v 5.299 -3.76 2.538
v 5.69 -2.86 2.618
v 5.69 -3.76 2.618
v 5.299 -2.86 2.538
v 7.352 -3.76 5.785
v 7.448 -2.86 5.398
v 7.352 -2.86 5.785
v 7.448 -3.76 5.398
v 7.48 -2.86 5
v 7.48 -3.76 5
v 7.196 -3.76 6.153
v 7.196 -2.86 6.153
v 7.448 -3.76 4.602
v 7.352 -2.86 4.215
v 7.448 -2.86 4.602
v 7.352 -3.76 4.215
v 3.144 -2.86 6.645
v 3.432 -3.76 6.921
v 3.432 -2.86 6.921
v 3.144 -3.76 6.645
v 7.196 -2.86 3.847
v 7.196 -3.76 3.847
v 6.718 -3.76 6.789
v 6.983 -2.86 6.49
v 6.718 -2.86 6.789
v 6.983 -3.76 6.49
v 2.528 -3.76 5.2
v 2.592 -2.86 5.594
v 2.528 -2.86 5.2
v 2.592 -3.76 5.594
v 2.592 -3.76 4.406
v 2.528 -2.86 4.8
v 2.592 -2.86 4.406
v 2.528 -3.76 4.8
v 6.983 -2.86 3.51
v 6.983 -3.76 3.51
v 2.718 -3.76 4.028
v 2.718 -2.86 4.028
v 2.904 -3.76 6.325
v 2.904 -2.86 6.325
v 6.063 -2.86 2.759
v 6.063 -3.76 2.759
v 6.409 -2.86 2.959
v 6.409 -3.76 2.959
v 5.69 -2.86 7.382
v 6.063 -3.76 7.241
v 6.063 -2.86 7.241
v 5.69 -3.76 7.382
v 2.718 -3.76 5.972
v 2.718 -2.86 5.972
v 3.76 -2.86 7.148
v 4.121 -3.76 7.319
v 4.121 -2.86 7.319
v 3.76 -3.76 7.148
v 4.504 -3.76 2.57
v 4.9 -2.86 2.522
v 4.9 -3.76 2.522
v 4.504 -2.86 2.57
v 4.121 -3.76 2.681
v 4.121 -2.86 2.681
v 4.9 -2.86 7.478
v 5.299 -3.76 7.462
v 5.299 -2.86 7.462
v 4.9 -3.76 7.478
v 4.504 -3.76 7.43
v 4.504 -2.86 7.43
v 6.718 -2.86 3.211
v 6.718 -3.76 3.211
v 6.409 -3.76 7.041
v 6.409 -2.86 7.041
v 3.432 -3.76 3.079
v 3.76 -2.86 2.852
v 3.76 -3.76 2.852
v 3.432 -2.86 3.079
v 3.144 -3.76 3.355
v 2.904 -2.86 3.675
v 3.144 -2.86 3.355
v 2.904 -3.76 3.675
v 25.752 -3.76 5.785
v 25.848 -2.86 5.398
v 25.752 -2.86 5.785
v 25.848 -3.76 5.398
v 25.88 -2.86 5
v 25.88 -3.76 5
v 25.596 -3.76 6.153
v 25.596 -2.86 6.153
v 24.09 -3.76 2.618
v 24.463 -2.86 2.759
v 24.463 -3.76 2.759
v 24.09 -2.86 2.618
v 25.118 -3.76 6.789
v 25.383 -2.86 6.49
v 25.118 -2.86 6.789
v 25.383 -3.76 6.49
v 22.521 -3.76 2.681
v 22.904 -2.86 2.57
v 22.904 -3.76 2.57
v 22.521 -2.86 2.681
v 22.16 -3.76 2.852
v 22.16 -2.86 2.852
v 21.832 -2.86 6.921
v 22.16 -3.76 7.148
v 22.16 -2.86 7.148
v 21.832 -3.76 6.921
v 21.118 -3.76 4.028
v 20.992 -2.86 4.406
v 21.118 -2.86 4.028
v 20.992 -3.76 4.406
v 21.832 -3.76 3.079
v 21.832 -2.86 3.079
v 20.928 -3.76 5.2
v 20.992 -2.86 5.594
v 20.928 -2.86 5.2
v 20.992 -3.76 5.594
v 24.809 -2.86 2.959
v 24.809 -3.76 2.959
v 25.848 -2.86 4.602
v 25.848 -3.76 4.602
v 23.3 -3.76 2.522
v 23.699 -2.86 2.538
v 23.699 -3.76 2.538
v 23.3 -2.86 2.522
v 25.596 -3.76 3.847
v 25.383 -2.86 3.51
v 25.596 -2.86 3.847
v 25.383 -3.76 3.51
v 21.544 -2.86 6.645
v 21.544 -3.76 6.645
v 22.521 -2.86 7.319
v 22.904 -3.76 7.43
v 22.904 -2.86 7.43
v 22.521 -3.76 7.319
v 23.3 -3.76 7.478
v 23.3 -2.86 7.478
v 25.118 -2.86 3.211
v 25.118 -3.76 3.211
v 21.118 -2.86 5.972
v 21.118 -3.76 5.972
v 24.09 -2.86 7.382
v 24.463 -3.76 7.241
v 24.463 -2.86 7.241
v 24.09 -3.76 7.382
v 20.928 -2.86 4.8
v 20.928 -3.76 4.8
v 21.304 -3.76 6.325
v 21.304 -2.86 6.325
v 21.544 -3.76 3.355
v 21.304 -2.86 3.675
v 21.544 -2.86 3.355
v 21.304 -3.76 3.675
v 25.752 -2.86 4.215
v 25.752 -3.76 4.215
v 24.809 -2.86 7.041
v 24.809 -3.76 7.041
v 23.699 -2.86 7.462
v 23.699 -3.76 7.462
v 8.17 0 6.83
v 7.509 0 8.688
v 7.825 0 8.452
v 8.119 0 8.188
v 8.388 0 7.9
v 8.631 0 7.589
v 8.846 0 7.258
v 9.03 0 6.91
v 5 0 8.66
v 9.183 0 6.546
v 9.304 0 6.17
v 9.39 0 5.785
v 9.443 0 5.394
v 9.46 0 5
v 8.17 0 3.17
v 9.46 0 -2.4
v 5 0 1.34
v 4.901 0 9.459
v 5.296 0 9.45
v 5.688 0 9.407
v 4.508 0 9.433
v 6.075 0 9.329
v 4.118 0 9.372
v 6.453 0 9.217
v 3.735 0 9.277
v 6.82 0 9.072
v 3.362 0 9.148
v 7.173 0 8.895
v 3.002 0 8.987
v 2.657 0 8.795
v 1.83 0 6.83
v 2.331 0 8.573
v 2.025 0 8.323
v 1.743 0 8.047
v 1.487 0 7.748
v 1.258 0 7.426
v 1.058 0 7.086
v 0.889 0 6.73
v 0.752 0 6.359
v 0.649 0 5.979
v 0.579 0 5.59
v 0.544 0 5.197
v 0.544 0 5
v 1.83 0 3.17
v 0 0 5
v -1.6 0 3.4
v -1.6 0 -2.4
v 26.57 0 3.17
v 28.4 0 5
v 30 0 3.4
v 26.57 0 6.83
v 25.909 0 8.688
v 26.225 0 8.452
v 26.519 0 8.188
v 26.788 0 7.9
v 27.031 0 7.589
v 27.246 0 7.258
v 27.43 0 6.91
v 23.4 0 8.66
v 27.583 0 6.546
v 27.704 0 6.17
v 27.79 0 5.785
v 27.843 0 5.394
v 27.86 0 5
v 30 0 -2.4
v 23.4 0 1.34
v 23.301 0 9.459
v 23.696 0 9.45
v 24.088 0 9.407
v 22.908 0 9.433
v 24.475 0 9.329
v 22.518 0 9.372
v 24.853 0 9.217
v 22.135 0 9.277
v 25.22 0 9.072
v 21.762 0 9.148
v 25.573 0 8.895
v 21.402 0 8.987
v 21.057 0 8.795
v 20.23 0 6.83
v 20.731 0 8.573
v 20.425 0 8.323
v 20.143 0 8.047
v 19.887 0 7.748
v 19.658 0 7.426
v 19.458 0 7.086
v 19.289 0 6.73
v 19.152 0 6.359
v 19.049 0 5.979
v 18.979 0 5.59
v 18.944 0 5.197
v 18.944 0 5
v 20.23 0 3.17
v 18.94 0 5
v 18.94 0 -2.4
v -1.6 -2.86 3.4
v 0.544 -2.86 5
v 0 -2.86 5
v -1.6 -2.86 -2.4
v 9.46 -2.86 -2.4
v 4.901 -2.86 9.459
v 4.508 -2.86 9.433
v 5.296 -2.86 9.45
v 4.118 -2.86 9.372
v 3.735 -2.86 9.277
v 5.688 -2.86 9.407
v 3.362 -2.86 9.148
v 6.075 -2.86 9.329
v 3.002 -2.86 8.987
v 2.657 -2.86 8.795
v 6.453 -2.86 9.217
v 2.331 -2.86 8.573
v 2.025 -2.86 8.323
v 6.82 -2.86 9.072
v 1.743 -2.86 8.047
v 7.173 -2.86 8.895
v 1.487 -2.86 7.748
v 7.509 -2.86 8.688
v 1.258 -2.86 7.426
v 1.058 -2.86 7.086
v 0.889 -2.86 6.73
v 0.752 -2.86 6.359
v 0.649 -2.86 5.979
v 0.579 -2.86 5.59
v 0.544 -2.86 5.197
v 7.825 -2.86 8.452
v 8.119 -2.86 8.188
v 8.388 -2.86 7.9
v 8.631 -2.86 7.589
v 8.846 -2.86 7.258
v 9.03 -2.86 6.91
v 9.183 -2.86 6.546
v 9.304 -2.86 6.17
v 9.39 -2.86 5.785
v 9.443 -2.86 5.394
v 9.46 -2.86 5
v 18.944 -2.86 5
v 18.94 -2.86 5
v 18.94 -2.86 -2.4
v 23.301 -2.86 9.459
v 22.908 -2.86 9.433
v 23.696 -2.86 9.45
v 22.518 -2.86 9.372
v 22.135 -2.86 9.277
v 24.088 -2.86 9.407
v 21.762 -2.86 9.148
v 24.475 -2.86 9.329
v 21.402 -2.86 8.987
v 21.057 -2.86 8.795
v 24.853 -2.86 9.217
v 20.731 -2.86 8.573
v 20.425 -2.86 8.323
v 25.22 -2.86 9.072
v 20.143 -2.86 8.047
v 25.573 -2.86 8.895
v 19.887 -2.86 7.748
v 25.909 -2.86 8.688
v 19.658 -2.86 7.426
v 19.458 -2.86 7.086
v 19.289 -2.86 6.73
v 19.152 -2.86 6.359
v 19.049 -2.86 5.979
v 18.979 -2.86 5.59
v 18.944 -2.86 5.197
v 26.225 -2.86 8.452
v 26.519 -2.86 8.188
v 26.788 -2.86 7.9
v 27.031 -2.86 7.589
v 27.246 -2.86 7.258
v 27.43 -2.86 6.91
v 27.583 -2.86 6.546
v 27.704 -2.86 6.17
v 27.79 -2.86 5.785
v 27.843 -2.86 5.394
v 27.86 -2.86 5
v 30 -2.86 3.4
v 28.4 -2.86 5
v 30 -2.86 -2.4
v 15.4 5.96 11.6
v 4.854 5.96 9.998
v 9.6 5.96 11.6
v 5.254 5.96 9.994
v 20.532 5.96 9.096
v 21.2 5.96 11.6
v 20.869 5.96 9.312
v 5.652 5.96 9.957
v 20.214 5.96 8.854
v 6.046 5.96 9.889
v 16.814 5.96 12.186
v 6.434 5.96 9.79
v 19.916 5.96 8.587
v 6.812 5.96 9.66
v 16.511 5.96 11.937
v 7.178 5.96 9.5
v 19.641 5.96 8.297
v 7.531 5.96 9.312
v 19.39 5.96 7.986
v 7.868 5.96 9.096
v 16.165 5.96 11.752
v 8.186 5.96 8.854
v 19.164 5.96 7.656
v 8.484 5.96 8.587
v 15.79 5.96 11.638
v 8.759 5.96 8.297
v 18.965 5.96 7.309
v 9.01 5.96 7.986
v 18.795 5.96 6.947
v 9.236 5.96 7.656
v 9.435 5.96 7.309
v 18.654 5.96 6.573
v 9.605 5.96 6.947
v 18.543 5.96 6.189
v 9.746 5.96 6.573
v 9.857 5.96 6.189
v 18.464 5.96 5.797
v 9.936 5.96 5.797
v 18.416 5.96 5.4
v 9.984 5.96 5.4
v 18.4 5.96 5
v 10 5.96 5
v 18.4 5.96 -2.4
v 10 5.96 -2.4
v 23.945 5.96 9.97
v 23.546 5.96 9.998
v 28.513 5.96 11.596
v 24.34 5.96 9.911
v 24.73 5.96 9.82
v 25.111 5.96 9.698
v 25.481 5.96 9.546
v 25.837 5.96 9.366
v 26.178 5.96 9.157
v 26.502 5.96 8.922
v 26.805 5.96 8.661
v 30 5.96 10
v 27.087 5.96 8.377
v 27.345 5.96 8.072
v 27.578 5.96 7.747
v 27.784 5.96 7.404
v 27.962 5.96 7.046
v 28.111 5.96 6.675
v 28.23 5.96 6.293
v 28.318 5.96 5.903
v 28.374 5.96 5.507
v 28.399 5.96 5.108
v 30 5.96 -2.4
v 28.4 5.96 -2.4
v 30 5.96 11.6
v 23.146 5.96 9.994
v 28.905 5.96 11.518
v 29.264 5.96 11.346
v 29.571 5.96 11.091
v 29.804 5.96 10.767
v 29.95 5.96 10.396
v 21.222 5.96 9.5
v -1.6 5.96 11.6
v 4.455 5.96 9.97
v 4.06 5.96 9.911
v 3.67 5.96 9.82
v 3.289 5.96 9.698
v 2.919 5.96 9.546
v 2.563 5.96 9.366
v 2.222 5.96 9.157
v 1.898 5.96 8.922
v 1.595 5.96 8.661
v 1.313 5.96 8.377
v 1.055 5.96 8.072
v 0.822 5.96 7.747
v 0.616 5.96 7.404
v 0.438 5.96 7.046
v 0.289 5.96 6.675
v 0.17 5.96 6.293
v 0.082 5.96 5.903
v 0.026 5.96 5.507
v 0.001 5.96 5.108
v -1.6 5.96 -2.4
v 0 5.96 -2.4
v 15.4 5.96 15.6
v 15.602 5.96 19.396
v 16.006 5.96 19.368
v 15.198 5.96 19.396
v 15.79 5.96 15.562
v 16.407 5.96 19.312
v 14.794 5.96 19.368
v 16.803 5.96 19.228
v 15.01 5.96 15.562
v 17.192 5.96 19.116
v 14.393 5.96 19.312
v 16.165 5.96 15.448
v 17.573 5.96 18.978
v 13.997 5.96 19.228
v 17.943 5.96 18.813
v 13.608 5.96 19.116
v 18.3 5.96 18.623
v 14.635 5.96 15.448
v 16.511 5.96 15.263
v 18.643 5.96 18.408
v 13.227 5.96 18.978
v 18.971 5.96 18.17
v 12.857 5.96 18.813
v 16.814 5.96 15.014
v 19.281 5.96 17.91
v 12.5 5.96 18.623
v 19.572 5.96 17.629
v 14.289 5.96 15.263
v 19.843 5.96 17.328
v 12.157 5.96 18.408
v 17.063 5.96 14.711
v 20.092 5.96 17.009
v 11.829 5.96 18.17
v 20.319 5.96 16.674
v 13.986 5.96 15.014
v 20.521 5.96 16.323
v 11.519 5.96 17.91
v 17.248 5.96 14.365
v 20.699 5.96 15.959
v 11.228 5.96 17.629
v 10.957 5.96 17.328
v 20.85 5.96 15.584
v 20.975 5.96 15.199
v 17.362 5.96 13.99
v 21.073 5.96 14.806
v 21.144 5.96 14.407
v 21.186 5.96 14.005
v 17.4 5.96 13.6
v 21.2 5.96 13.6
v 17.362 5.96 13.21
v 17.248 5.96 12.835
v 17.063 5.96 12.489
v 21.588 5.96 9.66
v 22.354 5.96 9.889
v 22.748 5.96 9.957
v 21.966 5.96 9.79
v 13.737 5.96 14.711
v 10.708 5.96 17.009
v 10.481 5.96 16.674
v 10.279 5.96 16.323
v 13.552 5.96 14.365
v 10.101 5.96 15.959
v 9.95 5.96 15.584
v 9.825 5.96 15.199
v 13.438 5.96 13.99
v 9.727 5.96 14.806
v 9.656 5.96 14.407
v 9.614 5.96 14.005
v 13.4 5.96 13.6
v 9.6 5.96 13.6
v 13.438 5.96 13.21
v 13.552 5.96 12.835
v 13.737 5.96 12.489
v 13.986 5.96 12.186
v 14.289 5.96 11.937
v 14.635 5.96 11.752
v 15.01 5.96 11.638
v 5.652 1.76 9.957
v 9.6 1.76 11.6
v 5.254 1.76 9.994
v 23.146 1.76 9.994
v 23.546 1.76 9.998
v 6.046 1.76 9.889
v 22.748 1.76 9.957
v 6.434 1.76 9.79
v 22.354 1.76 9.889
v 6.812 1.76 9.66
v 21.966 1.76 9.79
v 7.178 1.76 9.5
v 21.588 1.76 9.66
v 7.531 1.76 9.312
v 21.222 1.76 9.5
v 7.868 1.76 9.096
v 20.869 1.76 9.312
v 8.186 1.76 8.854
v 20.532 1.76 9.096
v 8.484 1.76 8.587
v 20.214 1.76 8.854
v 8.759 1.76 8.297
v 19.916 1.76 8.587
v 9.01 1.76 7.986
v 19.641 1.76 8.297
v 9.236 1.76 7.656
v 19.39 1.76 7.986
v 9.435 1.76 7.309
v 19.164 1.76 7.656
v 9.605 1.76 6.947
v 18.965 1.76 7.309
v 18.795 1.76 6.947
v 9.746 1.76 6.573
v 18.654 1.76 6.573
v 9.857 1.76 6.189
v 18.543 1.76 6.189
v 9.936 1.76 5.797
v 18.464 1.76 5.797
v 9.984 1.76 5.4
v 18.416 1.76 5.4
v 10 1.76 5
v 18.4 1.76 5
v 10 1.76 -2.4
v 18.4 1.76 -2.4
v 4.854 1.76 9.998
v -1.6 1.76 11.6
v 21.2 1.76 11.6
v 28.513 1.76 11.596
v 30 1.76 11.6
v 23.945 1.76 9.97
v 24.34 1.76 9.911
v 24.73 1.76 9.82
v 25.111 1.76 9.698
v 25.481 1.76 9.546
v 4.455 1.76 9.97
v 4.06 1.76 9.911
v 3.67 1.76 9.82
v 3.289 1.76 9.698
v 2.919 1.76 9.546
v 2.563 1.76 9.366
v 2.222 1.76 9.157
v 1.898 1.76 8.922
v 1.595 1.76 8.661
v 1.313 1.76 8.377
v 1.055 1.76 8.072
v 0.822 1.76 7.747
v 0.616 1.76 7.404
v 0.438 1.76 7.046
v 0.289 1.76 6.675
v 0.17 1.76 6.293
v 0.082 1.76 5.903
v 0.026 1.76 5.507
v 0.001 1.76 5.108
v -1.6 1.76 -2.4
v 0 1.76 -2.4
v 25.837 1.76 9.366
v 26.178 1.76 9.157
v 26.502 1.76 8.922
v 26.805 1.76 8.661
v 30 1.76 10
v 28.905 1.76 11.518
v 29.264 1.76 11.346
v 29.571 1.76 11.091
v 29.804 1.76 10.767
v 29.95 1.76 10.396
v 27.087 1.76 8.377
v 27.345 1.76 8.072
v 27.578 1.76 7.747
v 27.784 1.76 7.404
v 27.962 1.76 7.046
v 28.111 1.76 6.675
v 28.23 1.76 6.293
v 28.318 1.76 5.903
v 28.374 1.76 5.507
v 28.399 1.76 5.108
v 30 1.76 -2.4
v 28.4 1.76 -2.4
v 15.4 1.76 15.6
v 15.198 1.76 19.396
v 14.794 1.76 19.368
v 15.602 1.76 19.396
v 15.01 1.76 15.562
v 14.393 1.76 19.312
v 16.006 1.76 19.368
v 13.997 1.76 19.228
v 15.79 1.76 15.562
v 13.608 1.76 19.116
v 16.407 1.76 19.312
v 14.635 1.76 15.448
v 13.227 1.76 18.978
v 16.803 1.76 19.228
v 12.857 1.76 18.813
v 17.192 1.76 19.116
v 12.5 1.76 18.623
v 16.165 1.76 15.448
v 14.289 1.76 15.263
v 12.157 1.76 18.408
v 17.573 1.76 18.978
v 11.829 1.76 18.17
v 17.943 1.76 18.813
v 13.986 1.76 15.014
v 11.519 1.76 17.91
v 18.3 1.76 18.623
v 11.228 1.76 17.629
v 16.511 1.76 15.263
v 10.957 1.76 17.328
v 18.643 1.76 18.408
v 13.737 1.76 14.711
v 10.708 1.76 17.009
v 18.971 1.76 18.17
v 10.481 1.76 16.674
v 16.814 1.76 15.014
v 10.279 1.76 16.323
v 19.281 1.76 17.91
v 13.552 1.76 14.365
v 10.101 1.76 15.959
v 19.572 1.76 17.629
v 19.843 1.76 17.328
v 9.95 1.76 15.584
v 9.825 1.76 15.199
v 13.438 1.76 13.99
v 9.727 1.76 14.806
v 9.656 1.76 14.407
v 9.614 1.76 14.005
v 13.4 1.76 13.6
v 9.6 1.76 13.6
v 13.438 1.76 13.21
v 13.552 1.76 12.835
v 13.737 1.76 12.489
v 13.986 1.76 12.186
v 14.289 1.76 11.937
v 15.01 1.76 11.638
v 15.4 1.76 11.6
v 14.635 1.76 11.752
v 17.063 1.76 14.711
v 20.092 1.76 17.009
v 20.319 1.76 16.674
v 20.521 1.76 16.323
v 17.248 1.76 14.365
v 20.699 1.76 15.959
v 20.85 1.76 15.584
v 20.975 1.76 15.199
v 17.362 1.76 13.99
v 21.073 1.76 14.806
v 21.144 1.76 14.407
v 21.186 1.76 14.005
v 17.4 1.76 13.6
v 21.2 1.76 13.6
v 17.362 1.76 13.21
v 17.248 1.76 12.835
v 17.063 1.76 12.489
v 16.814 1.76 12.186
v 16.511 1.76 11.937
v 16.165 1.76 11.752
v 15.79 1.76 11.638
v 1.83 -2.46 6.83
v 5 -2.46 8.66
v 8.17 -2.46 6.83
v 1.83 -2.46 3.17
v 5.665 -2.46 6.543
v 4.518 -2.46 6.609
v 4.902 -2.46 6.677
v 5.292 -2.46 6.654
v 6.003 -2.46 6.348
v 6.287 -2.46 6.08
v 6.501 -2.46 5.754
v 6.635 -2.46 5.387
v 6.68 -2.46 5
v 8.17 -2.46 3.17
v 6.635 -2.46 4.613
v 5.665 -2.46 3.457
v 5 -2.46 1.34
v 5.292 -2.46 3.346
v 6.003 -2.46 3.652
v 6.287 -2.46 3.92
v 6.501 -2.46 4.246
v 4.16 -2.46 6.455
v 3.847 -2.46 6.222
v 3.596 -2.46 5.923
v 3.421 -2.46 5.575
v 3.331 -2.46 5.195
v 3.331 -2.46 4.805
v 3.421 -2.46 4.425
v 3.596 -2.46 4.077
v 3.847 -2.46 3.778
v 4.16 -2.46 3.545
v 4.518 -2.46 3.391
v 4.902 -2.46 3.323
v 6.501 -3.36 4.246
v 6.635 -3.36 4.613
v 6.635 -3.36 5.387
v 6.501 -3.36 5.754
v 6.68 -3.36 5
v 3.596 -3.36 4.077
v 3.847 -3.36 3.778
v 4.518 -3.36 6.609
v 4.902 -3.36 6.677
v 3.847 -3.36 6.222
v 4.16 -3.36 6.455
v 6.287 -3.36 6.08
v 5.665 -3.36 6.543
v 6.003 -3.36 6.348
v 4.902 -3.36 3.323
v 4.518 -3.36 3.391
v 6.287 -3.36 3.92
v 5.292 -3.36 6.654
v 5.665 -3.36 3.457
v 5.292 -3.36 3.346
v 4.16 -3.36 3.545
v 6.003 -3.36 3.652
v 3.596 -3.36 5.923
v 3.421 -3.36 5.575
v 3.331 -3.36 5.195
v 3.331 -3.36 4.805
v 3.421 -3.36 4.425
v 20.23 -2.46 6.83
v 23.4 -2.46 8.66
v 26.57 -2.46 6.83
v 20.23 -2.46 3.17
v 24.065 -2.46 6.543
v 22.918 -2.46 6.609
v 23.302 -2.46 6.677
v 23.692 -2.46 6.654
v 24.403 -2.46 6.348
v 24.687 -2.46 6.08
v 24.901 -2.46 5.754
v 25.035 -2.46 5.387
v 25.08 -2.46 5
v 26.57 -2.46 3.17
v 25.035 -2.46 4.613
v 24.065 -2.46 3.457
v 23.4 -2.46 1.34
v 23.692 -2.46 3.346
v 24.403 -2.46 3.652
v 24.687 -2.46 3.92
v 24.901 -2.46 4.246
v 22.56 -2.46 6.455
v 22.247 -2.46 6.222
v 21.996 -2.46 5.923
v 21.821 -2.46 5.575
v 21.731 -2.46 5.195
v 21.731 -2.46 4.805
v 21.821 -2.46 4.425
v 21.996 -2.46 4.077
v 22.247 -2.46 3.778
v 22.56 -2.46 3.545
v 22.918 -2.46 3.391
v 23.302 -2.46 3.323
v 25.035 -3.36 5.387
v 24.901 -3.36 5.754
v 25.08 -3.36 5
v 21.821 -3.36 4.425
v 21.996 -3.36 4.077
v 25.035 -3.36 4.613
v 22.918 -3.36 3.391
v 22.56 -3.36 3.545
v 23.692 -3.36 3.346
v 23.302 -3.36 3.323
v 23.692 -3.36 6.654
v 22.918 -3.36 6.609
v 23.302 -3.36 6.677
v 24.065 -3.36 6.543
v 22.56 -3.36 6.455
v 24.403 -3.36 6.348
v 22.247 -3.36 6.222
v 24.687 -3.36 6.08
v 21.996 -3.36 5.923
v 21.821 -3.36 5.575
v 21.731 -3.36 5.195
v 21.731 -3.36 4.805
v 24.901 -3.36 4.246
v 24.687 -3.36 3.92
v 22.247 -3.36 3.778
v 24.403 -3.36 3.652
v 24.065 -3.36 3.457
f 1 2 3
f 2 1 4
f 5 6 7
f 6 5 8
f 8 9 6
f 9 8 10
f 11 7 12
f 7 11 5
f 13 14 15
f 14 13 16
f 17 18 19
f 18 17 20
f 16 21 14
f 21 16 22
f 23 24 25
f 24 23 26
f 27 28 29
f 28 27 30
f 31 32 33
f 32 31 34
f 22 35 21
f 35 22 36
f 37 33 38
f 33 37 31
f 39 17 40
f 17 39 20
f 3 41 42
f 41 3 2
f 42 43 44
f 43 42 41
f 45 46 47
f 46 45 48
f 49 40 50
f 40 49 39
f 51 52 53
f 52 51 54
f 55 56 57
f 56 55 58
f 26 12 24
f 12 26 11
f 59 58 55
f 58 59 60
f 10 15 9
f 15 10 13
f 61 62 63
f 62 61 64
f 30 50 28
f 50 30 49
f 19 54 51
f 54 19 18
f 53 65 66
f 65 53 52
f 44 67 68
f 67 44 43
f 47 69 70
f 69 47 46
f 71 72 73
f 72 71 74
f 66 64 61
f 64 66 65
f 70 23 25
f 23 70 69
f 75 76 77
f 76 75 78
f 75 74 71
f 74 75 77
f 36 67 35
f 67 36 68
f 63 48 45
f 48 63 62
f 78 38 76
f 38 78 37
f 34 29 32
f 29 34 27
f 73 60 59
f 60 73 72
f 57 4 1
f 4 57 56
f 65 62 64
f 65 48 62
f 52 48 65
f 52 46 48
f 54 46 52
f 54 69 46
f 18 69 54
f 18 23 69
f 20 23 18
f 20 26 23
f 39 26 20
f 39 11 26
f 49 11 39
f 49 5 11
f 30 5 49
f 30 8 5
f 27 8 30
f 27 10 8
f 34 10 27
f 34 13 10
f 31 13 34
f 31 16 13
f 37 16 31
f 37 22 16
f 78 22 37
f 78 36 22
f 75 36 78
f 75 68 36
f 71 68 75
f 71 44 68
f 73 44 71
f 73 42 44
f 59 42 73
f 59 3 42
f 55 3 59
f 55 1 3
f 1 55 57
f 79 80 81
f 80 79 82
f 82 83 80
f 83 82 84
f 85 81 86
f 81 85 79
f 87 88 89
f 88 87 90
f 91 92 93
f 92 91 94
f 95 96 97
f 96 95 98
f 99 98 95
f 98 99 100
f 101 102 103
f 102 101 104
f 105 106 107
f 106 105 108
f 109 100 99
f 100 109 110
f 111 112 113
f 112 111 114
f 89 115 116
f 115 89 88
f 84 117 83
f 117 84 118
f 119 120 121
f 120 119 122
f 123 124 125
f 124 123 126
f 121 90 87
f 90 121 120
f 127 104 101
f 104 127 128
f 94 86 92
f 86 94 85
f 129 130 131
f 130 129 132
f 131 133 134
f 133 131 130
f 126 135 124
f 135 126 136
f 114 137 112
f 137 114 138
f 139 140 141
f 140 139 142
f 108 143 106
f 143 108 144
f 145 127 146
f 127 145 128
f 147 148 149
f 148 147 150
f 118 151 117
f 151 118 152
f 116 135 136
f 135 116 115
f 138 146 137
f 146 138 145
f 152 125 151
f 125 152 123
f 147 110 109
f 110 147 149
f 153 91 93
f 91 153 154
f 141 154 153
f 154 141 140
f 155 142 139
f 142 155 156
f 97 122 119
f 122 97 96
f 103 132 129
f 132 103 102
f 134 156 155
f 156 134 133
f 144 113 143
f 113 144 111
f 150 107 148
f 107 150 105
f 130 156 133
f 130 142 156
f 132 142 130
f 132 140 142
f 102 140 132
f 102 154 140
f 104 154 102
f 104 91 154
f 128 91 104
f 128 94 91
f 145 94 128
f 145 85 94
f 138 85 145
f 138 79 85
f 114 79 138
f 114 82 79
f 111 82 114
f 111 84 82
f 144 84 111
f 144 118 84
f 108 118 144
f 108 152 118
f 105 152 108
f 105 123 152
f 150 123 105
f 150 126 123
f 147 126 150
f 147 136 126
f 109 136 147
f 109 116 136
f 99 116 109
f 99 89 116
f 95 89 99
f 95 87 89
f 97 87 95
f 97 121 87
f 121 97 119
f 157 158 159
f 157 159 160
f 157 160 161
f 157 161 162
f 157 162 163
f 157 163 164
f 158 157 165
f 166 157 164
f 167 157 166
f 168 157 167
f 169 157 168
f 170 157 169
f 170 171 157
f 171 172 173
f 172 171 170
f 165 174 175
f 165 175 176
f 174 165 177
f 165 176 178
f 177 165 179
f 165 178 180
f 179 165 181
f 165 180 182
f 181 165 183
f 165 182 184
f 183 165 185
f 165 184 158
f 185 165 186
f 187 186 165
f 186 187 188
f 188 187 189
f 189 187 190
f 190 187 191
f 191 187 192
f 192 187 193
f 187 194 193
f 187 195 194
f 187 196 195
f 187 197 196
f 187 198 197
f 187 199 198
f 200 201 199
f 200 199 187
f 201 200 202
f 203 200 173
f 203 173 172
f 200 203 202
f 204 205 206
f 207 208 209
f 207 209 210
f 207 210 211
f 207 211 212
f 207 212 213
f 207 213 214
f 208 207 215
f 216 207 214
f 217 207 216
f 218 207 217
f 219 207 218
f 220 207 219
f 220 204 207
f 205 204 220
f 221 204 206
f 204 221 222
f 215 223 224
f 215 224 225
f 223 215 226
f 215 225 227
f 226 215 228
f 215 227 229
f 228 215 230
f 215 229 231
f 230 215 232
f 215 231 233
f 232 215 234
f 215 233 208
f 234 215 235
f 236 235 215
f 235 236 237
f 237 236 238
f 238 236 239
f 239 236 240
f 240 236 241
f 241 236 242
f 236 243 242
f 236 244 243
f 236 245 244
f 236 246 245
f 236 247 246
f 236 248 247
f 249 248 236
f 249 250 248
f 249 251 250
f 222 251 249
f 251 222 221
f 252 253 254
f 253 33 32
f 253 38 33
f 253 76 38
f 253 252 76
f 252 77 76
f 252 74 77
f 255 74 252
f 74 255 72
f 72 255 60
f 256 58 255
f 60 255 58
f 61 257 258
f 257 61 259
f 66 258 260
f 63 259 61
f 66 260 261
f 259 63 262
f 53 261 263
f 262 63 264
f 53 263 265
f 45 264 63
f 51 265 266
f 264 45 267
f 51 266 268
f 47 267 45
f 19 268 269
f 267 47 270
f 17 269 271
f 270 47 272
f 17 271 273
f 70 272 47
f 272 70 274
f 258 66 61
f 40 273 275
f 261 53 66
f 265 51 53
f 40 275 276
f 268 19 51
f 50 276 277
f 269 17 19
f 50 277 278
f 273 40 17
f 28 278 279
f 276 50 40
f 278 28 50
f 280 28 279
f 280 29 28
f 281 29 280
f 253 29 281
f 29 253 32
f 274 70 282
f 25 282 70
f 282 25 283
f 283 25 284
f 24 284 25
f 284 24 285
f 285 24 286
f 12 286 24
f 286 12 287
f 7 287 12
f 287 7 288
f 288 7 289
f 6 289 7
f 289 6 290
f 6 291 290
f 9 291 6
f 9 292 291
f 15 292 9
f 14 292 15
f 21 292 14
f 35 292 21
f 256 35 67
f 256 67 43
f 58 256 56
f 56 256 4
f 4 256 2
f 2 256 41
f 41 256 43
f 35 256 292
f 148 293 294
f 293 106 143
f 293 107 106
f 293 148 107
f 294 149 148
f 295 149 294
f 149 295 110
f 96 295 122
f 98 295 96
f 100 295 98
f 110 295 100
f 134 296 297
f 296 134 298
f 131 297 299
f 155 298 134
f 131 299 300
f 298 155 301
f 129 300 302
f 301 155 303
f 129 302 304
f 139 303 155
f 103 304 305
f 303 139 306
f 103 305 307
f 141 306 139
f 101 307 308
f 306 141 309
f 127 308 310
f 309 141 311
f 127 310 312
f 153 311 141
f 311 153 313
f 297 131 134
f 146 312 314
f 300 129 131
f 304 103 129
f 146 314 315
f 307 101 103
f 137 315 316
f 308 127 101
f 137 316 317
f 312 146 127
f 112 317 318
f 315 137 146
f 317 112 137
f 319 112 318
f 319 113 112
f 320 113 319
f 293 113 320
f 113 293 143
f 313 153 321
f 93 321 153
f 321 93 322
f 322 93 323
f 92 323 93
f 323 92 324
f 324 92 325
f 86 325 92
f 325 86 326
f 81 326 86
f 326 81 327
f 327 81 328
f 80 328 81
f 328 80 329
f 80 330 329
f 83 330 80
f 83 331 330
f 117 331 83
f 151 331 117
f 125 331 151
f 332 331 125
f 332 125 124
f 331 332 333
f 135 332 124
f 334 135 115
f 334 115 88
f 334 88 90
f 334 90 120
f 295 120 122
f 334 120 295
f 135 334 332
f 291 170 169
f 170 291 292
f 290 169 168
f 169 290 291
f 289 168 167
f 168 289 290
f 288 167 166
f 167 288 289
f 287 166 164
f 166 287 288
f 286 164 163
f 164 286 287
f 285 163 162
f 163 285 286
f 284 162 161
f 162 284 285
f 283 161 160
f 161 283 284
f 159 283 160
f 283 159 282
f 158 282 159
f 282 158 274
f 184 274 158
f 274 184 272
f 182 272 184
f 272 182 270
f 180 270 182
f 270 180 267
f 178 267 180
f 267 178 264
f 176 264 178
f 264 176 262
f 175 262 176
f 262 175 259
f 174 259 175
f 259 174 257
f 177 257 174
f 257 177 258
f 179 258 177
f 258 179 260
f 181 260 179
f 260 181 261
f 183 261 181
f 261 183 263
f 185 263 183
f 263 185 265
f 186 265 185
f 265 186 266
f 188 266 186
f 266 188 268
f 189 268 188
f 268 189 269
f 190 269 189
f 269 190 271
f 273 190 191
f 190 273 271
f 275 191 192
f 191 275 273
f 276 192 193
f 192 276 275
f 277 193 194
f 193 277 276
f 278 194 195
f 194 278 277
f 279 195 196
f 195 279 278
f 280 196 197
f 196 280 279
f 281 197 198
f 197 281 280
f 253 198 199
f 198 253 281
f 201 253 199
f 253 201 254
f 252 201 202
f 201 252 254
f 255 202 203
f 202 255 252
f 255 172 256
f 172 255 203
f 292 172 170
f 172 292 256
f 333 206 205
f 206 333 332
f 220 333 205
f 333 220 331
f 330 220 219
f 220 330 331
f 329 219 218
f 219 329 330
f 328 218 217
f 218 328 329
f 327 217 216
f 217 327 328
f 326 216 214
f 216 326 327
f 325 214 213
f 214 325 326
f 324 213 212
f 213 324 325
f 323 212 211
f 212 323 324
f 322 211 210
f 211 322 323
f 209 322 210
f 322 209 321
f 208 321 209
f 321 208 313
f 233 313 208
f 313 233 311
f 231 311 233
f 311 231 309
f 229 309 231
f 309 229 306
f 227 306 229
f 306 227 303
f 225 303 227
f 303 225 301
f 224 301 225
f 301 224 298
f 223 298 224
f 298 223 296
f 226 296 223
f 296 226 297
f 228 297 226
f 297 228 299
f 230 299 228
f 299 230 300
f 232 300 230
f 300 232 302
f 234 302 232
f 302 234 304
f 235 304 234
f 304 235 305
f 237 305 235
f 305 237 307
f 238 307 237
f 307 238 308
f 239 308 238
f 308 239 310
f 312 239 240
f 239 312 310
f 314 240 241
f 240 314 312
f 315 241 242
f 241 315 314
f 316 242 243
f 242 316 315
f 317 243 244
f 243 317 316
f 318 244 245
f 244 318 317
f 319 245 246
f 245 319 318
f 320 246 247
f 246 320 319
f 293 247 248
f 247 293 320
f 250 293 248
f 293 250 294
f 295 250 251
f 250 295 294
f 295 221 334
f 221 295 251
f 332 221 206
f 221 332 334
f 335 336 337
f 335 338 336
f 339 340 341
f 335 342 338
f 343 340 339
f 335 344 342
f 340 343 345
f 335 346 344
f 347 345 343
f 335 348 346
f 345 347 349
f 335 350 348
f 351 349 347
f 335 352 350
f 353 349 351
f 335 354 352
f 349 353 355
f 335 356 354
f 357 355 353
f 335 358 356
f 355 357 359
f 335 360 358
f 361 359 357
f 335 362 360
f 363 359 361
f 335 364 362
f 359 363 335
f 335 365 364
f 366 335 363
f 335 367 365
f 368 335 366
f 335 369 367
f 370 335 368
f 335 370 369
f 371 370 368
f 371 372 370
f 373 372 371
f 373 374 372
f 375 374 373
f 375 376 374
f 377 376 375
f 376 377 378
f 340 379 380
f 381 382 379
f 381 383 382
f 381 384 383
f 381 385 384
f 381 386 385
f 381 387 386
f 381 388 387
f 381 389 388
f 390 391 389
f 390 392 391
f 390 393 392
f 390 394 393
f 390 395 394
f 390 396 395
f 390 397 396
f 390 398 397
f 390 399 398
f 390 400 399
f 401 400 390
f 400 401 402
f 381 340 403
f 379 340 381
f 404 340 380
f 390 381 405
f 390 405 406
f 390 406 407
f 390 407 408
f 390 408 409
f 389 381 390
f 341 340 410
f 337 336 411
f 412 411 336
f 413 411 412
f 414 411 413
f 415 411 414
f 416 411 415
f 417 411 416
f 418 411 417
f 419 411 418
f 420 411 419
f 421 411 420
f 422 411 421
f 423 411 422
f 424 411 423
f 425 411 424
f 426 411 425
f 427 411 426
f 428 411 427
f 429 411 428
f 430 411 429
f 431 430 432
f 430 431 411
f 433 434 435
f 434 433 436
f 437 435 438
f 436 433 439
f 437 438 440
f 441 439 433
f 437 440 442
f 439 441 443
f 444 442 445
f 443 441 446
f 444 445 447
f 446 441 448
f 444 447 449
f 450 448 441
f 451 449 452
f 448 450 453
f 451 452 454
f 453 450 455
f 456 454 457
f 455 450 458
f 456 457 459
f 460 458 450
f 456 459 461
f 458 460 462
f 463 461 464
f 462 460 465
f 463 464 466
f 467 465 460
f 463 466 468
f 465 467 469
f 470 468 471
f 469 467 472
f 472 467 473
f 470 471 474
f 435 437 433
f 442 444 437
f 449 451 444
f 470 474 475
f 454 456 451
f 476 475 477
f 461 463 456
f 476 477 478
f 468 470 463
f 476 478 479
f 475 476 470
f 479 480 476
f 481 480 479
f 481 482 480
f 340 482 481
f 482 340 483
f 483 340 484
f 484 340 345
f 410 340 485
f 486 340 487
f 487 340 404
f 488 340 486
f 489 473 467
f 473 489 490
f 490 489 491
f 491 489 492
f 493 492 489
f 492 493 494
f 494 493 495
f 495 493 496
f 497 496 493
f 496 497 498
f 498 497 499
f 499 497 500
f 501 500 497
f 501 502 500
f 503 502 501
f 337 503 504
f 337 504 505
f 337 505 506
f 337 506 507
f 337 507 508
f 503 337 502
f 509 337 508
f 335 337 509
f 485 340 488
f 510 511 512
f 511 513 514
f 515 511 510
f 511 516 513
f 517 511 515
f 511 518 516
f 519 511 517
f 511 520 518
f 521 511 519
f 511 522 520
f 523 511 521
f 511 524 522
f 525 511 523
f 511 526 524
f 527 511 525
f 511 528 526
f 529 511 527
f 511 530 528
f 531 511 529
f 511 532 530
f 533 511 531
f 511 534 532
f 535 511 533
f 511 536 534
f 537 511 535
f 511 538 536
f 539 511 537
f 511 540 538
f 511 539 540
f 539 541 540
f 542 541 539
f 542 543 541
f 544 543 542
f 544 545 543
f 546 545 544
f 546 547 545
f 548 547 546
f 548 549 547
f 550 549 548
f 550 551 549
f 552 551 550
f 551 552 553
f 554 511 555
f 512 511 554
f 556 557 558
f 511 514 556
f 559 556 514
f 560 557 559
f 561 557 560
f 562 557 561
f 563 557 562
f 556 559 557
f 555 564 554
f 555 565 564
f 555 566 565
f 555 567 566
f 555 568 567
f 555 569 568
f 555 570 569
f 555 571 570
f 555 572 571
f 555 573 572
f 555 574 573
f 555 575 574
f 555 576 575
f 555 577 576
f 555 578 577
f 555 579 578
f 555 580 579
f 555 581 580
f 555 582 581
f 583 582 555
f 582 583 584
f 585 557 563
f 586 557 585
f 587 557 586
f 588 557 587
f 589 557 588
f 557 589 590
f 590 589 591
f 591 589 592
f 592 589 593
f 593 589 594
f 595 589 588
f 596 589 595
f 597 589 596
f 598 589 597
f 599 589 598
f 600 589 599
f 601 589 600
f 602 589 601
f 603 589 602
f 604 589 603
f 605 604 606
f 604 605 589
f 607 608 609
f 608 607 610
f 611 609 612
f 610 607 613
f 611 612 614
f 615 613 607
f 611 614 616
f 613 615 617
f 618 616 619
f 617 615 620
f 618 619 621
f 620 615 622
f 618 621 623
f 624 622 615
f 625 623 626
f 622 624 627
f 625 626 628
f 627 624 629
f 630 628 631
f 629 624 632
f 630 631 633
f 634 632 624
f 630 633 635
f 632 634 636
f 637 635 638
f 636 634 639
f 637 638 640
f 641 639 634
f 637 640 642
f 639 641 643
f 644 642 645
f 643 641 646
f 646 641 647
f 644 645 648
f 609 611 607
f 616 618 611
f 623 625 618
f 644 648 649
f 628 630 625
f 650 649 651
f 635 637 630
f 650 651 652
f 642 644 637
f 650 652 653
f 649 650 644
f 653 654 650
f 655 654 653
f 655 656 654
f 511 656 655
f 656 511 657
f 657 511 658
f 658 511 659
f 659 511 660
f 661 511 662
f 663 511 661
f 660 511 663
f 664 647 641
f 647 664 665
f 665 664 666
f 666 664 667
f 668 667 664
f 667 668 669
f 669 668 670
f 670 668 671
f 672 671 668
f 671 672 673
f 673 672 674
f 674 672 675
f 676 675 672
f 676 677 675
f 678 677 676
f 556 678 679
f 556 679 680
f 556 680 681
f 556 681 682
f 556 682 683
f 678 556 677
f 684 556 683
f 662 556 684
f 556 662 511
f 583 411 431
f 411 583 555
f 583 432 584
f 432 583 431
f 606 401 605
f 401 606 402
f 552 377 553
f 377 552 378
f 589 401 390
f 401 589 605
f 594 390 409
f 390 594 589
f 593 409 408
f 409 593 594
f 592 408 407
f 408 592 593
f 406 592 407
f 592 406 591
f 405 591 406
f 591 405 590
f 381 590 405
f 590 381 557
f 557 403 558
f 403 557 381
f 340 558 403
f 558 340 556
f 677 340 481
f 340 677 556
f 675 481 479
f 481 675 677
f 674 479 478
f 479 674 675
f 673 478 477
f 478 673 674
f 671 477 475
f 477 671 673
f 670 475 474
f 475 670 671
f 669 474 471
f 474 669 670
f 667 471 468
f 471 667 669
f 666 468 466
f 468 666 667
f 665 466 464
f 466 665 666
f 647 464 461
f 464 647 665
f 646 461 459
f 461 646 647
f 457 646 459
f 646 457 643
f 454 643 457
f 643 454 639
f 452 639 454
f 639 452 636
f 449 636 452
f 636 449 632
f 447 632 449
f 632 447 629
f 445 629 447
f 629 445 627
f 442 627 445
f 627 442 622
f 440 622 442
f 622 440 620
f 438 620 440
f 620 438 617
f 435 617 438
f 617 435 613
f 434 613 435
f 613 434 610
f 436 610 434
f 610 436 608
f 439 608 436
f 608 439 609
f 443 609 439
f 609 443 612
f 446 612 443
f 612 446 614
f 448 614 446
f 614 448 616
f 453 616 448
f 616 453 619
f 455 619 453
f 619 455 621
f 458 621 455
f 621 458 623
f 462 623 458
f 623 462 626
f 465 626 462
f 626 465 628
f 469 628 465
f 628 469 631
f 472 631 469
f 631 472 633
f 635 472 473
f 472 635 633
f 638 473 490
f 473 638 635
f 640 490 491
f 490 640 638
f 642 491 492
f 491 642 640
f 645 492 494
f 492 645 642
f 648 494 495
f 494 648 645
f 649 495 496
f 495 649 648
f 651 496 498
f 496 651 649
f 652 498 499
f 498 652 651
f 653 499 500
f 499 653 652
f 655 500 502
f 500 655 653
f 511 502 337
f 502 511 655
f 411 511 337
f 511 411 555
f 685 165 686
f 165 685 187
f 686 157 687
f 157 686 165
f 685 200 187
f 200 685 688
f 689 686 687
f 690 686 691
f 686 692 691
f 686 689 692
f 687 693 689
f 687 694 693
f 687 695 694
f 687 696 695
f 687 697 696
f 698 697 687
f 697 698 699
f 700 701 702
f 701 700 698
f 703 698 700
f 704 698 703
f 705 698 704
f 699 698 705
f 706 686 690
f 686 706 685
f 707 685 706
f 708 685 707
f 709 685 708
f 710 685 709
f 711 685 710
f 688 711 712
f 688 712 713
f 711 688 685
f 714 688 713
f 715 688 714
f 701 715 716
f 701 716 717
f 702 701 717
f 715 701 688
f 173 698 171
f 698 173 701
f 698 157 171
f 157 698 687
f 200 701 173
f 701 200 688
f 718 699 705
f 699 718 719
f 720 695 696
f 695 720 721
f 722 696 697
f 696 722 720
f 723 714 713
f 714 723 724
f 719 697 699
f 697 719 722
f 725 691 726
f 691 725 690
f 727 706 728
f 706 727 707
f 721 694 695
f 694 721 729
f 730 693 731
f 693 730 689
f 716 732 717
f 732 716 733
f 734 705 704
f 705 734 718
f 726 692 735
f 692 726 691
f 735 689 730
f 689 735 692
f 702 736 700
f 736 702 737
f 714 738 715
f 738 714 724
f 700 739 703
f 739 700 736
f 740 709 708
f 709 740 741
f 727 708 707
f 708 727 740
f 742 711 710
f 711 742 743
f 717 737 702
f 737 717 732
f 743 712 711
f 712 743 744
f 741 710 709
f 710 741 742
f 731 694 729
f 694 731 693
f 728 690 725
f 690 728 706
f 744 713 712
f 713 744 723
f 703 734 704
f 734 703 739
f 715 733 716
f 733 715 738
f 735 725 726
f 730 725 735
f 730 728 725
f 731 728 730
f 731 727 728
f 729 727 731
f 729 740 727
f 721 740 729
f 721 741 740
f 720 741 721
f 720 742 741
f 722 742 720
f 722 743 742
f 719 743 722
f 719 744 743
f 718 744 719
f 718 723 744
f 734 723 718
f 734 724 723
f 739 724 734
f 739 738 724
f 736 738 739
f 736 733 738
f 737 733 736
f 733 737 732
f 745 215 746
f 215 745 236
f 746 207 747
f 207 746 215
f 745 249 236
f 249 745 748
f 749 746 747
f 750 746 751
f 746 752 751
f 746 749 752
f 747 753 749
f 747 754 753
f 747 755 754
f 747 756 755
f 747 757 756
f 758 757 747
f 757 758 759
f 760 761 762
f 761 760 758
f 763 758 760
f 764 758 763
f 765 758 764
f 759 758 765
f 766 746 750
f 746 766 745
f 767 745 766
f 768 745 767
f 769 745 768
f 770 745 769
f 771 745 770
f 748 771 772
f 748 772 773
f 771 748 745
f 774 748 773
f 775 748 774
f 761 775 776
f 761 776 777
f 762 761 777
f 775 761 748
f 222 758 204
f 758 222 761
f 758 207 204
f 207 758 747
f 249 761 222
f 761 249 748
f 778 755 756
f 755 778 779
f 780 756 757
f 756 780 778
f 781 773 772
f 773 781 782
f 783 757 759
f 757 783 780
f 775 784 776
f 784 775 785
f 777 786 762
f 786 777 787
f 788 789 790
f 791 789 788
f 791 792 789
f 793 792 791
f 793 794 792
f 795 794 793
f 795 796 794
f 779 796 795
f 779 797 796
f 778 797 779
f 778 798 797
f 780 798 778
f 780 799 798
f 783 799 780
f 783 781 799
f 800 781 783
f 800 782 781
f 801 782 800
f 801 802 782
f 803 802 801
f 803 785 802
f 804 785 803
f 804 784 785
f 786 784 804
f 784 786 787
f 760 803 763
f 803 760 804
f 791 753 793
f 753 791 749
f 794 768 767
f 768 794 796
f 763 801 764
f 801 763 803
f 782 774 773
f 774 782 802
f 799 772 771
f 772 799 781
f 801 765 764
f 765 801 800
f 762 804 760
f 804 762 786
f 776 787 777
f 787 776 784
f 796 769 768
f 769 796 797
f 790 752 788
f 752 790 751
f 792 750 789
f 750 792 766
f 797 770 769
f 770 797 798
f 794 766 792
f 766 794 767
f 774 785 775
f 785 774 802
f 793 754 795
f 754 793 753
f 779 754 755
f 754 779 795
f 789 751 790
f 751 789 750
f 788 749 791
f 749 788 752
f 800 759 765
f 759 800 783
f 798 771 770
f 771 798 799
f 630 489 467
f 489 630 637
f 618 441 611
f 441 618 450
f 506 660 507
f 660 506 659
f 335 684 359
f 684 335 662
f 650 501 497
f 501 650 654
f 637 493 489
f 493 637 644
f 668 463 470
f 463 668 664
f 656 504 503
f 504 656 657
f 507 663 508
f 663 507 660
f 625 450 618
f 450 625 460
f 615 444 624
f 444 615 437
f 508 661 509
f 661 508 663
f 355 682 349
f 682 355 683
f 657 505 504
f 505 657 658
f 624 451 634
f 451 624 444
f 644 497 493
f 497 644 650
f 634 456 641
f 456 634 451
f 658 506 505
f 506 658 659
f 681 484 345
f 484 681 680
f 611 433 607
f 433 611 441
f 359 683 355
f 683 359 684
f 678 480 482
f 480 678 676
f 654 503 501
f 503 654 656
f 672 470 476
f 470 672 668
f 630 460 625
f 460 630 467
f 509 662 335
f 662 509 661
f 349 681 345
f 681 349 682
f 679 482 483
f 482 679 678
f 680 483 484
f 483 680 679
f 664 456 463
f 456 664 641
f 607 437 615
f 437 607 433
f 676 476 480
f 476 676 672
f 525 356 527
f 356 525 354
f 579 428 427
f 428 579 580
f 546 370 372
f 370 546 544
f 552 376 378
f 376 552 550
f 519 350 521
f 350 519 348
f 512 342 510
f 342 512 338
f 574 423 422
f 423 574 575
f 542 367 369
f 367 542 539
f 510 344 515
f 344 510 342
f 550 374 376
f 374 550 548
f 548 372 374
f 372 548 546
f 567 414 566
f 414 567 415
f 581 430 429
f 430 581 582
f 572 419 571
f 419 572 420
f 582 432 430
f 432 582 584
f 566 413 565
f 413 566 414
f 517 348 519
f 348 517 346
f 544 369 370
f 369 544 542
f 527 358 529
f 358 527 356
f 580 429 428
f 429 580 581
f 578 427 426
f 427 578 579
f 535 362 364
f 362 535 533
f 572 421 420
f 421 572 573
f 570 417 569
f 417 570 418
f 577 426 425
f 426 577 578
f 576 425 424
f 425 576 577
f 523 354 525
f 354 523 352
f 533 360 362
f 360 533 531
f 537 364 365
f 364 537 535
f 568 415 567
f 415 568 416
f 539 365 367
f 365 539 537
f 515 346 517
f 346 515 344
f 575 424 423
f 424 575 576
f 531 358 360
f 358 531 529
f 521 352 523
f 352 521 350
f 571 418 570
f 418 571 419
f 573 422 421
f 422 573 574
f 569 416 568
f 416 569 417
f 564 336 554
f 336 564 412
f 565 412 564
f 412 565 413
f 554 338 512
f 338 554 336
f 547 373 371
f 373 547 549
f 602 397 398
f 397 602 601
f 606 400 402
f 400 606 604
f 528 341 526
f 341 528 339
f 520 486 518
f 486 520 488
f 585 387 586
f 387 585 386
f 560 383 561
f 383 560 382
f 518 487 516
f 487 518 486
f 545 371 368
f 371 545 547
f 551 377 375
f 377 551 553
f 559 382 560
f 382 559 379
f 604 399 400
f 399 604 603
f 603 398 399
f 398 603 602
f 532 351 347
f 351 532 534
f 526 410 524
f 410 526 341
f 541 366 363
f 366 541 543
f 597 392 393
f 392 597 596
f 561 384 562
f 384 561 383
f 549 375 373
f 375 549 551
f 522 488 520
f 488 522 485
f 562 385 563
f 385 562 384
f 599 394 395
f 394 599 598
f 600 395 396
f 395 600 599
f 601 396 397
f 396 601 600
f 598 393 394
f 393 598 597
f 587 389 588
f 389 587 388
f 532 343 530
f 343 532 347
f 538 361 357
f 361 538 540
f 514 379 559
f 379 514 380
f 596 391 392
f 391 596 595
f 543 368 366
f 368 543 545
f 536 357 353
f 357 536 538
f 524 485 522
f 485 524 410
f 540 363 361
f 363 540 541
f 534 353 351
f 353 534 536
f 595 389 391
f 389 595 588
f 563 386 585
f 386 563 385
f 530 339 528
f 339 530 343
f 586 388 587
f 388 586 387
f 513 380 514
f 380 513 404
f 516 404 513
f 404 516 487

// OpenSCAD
// Copyright (C) 2025 Arif K. Rafiq
// This program is free software: you can redistribute it and/or modify
// it under the terms of the GNU General Public License as published by
// the Free Software Foundation, either version 3 of the License, or
// (at your option) any later version.

// This program is distributed in the hope that it will be useful,
// but WITHOUT ANY WARRANTY; without even the implied warranty of
// MERCHANTABILITY or FITNESS FOR A PARTICULAR PURPOSE.  See the
// GNU General Public License for more details.

// You should have received a copy of the GNU General Public License
// along with this file.  If not, see <https://www.gnu.org/licenses/>,
// or write to: license@temperedoptimism.com


/* 
(b)readth       :(w)est (X-)   (c)enter (X0) (e)east (X+)
(h)eight        :(d)own (Z-)   (g)round(Z0)  (u)p (Z+)

Vectors (v)     :(x), (y), (z)
Thicknesses (t) : Thicknesses to resolve 3D printer limits or rendering issues.
Proportion (p)  : container for grouping (r)adius and (i)ntensity into a singl 2d vector acccessed using .x and .y respectively
*/
/* 17:08 */
// Fixed in example3.scad       // Set limits in customizer
/* [Thicknesses (x),(y),(z)] */
tFitGap = [0.16, 0.16, 0.16];   //[0.00:0.01:0.64] 
tWallMin = [0.40, 0.40, 0.16];  //[0.16:0.08:1.60] 
/* [Proportional (x):(Radius, (y):(i)ntensity] */
pHexSink = [3.5, 2.3];          //[0.10:0.02:20.00] 
pFastShaft064 = [1.36, 5.80]; //0.10:0.02:20.00]
pFastShaft095 = [1.36, 9.30]; //0.10:0.02:20.00]
pWashSink = [4.00, 1.00]; //0.10:0.02:20.00]
/* [2D vectors (x), (y)] */
vTerminalW = [5.0, 5.0];     //[0.00:0.10:100] 
vTerminalE = [23.4, 5.0];    //[0.00:0.10:100]
vThermal = [ 15.4, 13.6];    //[0.00:0.10:100.00]
/* [Scalars] */
leadingEdge = 2.4; //[0.8:0.4:5.0]
flankEdge = 1.6; //[0.8:0.4:5.0]
trailingEdge = 1.6; //[0.8:0.4:3.6]
bBoard = 28.4; //[20:0.1:100.0]
hBoard = 1.6; //0.8:04:3.2]
// Adding space
hSpacer = 4.2; //[2.8:0.4:14]
rCorner = 1.6; //0.1
rTerminal = 5.0; //0.1
rThermal = 5.0;  //0.1
/* [Special ] */
fa0 = 4.0;     //[1:1:60]  
fs0 = 0.4;     //[0.1:0.1:4.0]  
fx0 = 3;       //[1,2,3,4,5,6,7,8,9,10]
/* [Hidden] */ 
tEps=0.01; 

/* Calucualted at run time. */
pHexSurround = [pHexSink.x + (tWallMin.x * 2) + tFitGap.x, pHexSink.y + tWallMin.y + tFitGap.y];
pExtension = [pFastShaft064.x + ((tWallMin.x + tFitGap.x)* 2), pFastShaft064.y + tWallMin.y + tFitGap.y - pHexSurround.y -hBoard - pWashSink.y];

//30.00-35.00 Circles, Also look at the customizer!!
// Rotate
rotate([90,0,0]){
  difference(){
    union() {
      // hex pocket surround
      linear_extrude(pHexSurround.y, convexity=fx0){ 
        polygon([[vTerminalW.x + pHexSurround.x, vTerminalW.y],
              [ vTerminalW.x + pHexSurround.x, -leadingEdge],
              [-flankEdge, -leadingEdge],
              [-flankEdge, vTerminalW.y - rCorner],
              [-flankEdge + rCorner, vTerminalW.y]]);
        polygon([[vTerminalE.x - pHexSurround.x, vTerminalE.y],
              [ vTerminalE.x - pHexSurround.x, -leadingEdge],
              [bBoard + flankEdge, -leadingEdge],
              [bBoard + flankEdge, vTerminalE.y - rCorner],
              [bBoard + flankEdge - rCorner, vTerminalE.y]]);       
              
        for(v = [vTerminalW, vTerminalE]){
          translate(v)  circle(pHexSurround.x, $fa=fa0, $fs=fs0 );
        }
      }
      // shaft extension
      for(v= [vTerminalW, vTerminalE]){
          translate([v.x, v.y, pHexSurround.y - tEps]) cylinder(pExtension.y + tEps, r=pExtension.x, $fa=fa0, $fs=fs0);
      }
      // board spacer
      translate([0, 0, -hBoard - tFitGap.y - hSpacer]) linear_extrude(hSpacer, convexity=fx0){
          polygon([[-flankEdge, -leadingEdge],
          [bBoard + flankEdge, -leadingEdge],
          for(a = [0:max(fa0,(fs0*360)/(2*PI*rCorner)):90]) [rCorner *cos(a), rCorner *sin(a)] + [bBoard + flankEdge - rCorner, vTerminalE.y + rTerminal + trailingEdge - rCorner ],
          [bBoard + flankEdge, vTerminalE.y + rTerminal + trailingEdge],
          [vThermal.x + rThermal +(tWallMin.x * 2), vTerminalE.y + rTerminal + trailingEdge],
          [vThermal.x + rThermal +(tWallMin.x * 2), vThermal.y],
          [vThermal.x - rThermal -(tWallMin.x * 2), vThermal.y],
          [vThermal.x - rThermal -(tWallMin.x * 2), vTerminalW.y + rTerminal + trailingEdge],
          [-flankEdge, vTerminalW.y + rTerminal + trailingEdge]]);
          translate(vThermal) circle(rThermal + (tWallMin.x * 2), $fa=fa0, $fs=fs0);
      }
          
    }
    for(v = [vTerminalW, vTerminalE]){
        // hex pocket
        #translate([v.x, v.y, -tEps]) rotate([0,0,30]) cylinder(pHexSurround.y - tWallMin.y + tEps, r=pHexSurround.x - (tWallMin.x * 2), $fn=6);
        // fastner hole
        #translate([v.x, v.y, -hBoard -pWashSink.y]) cylinder(pFastShaft064.y + tFitGap.y, r=pFastShaft064.x + (tFitGap.x * 2), $fa=fa0, $fs=fs0);
     
    }
   #translate([vThermal.x, vThermal.y, -hBoard + pWashSink.y]) rotate([0,180,0]) 
        cylinder(pFastShaft095.y + tFitGap.y, r=pFastShaft095.x + (tFitGap.x * 4), $fa=fa0, $fs=fs0);

    // terminal guide
   #translate([vTerminalW.x, vTerminalW.y, -hBoard - tFitGap.y -hSpacer -tEps ]) linear_extrude(hSpacer + (tEps *2), convexity=fx0) {
        polygon([for(a = [0:max(fa0, (fs0*360)/(2*PI*rTerminal)):180]) [rTerminal * cos(a), rTerminal *sin(a)]
        ,[-rTerminal, -vTerminalW.y -leadingEdge -tEps]
        ,[rTerminal, -vTerminalW.y -leadingEdge -tEps]]);
   }
   /* Mirror */
   #translate([vTerminalE.x, vTerminalE.y, -hBoard - tFitGap.y -hSpacer -tEps ]) linear_extrude(hSpacer + (tEps *2), convexity=fx0) {
        mirror([1,0,0]) 
        polygon([for(a = [0:max(fa0, (fs0*360)/(2*PI*rTerminal)):180]) [rTerminal * cos(a), rTerminal *sin(a)]
        ,[-rTerminal, -vTerminalW.y -leadingEdge -tEps]
        ,[rTerminal, -vTerminalW.y -leadingEdge -tEps]]);
   }
  }
}
